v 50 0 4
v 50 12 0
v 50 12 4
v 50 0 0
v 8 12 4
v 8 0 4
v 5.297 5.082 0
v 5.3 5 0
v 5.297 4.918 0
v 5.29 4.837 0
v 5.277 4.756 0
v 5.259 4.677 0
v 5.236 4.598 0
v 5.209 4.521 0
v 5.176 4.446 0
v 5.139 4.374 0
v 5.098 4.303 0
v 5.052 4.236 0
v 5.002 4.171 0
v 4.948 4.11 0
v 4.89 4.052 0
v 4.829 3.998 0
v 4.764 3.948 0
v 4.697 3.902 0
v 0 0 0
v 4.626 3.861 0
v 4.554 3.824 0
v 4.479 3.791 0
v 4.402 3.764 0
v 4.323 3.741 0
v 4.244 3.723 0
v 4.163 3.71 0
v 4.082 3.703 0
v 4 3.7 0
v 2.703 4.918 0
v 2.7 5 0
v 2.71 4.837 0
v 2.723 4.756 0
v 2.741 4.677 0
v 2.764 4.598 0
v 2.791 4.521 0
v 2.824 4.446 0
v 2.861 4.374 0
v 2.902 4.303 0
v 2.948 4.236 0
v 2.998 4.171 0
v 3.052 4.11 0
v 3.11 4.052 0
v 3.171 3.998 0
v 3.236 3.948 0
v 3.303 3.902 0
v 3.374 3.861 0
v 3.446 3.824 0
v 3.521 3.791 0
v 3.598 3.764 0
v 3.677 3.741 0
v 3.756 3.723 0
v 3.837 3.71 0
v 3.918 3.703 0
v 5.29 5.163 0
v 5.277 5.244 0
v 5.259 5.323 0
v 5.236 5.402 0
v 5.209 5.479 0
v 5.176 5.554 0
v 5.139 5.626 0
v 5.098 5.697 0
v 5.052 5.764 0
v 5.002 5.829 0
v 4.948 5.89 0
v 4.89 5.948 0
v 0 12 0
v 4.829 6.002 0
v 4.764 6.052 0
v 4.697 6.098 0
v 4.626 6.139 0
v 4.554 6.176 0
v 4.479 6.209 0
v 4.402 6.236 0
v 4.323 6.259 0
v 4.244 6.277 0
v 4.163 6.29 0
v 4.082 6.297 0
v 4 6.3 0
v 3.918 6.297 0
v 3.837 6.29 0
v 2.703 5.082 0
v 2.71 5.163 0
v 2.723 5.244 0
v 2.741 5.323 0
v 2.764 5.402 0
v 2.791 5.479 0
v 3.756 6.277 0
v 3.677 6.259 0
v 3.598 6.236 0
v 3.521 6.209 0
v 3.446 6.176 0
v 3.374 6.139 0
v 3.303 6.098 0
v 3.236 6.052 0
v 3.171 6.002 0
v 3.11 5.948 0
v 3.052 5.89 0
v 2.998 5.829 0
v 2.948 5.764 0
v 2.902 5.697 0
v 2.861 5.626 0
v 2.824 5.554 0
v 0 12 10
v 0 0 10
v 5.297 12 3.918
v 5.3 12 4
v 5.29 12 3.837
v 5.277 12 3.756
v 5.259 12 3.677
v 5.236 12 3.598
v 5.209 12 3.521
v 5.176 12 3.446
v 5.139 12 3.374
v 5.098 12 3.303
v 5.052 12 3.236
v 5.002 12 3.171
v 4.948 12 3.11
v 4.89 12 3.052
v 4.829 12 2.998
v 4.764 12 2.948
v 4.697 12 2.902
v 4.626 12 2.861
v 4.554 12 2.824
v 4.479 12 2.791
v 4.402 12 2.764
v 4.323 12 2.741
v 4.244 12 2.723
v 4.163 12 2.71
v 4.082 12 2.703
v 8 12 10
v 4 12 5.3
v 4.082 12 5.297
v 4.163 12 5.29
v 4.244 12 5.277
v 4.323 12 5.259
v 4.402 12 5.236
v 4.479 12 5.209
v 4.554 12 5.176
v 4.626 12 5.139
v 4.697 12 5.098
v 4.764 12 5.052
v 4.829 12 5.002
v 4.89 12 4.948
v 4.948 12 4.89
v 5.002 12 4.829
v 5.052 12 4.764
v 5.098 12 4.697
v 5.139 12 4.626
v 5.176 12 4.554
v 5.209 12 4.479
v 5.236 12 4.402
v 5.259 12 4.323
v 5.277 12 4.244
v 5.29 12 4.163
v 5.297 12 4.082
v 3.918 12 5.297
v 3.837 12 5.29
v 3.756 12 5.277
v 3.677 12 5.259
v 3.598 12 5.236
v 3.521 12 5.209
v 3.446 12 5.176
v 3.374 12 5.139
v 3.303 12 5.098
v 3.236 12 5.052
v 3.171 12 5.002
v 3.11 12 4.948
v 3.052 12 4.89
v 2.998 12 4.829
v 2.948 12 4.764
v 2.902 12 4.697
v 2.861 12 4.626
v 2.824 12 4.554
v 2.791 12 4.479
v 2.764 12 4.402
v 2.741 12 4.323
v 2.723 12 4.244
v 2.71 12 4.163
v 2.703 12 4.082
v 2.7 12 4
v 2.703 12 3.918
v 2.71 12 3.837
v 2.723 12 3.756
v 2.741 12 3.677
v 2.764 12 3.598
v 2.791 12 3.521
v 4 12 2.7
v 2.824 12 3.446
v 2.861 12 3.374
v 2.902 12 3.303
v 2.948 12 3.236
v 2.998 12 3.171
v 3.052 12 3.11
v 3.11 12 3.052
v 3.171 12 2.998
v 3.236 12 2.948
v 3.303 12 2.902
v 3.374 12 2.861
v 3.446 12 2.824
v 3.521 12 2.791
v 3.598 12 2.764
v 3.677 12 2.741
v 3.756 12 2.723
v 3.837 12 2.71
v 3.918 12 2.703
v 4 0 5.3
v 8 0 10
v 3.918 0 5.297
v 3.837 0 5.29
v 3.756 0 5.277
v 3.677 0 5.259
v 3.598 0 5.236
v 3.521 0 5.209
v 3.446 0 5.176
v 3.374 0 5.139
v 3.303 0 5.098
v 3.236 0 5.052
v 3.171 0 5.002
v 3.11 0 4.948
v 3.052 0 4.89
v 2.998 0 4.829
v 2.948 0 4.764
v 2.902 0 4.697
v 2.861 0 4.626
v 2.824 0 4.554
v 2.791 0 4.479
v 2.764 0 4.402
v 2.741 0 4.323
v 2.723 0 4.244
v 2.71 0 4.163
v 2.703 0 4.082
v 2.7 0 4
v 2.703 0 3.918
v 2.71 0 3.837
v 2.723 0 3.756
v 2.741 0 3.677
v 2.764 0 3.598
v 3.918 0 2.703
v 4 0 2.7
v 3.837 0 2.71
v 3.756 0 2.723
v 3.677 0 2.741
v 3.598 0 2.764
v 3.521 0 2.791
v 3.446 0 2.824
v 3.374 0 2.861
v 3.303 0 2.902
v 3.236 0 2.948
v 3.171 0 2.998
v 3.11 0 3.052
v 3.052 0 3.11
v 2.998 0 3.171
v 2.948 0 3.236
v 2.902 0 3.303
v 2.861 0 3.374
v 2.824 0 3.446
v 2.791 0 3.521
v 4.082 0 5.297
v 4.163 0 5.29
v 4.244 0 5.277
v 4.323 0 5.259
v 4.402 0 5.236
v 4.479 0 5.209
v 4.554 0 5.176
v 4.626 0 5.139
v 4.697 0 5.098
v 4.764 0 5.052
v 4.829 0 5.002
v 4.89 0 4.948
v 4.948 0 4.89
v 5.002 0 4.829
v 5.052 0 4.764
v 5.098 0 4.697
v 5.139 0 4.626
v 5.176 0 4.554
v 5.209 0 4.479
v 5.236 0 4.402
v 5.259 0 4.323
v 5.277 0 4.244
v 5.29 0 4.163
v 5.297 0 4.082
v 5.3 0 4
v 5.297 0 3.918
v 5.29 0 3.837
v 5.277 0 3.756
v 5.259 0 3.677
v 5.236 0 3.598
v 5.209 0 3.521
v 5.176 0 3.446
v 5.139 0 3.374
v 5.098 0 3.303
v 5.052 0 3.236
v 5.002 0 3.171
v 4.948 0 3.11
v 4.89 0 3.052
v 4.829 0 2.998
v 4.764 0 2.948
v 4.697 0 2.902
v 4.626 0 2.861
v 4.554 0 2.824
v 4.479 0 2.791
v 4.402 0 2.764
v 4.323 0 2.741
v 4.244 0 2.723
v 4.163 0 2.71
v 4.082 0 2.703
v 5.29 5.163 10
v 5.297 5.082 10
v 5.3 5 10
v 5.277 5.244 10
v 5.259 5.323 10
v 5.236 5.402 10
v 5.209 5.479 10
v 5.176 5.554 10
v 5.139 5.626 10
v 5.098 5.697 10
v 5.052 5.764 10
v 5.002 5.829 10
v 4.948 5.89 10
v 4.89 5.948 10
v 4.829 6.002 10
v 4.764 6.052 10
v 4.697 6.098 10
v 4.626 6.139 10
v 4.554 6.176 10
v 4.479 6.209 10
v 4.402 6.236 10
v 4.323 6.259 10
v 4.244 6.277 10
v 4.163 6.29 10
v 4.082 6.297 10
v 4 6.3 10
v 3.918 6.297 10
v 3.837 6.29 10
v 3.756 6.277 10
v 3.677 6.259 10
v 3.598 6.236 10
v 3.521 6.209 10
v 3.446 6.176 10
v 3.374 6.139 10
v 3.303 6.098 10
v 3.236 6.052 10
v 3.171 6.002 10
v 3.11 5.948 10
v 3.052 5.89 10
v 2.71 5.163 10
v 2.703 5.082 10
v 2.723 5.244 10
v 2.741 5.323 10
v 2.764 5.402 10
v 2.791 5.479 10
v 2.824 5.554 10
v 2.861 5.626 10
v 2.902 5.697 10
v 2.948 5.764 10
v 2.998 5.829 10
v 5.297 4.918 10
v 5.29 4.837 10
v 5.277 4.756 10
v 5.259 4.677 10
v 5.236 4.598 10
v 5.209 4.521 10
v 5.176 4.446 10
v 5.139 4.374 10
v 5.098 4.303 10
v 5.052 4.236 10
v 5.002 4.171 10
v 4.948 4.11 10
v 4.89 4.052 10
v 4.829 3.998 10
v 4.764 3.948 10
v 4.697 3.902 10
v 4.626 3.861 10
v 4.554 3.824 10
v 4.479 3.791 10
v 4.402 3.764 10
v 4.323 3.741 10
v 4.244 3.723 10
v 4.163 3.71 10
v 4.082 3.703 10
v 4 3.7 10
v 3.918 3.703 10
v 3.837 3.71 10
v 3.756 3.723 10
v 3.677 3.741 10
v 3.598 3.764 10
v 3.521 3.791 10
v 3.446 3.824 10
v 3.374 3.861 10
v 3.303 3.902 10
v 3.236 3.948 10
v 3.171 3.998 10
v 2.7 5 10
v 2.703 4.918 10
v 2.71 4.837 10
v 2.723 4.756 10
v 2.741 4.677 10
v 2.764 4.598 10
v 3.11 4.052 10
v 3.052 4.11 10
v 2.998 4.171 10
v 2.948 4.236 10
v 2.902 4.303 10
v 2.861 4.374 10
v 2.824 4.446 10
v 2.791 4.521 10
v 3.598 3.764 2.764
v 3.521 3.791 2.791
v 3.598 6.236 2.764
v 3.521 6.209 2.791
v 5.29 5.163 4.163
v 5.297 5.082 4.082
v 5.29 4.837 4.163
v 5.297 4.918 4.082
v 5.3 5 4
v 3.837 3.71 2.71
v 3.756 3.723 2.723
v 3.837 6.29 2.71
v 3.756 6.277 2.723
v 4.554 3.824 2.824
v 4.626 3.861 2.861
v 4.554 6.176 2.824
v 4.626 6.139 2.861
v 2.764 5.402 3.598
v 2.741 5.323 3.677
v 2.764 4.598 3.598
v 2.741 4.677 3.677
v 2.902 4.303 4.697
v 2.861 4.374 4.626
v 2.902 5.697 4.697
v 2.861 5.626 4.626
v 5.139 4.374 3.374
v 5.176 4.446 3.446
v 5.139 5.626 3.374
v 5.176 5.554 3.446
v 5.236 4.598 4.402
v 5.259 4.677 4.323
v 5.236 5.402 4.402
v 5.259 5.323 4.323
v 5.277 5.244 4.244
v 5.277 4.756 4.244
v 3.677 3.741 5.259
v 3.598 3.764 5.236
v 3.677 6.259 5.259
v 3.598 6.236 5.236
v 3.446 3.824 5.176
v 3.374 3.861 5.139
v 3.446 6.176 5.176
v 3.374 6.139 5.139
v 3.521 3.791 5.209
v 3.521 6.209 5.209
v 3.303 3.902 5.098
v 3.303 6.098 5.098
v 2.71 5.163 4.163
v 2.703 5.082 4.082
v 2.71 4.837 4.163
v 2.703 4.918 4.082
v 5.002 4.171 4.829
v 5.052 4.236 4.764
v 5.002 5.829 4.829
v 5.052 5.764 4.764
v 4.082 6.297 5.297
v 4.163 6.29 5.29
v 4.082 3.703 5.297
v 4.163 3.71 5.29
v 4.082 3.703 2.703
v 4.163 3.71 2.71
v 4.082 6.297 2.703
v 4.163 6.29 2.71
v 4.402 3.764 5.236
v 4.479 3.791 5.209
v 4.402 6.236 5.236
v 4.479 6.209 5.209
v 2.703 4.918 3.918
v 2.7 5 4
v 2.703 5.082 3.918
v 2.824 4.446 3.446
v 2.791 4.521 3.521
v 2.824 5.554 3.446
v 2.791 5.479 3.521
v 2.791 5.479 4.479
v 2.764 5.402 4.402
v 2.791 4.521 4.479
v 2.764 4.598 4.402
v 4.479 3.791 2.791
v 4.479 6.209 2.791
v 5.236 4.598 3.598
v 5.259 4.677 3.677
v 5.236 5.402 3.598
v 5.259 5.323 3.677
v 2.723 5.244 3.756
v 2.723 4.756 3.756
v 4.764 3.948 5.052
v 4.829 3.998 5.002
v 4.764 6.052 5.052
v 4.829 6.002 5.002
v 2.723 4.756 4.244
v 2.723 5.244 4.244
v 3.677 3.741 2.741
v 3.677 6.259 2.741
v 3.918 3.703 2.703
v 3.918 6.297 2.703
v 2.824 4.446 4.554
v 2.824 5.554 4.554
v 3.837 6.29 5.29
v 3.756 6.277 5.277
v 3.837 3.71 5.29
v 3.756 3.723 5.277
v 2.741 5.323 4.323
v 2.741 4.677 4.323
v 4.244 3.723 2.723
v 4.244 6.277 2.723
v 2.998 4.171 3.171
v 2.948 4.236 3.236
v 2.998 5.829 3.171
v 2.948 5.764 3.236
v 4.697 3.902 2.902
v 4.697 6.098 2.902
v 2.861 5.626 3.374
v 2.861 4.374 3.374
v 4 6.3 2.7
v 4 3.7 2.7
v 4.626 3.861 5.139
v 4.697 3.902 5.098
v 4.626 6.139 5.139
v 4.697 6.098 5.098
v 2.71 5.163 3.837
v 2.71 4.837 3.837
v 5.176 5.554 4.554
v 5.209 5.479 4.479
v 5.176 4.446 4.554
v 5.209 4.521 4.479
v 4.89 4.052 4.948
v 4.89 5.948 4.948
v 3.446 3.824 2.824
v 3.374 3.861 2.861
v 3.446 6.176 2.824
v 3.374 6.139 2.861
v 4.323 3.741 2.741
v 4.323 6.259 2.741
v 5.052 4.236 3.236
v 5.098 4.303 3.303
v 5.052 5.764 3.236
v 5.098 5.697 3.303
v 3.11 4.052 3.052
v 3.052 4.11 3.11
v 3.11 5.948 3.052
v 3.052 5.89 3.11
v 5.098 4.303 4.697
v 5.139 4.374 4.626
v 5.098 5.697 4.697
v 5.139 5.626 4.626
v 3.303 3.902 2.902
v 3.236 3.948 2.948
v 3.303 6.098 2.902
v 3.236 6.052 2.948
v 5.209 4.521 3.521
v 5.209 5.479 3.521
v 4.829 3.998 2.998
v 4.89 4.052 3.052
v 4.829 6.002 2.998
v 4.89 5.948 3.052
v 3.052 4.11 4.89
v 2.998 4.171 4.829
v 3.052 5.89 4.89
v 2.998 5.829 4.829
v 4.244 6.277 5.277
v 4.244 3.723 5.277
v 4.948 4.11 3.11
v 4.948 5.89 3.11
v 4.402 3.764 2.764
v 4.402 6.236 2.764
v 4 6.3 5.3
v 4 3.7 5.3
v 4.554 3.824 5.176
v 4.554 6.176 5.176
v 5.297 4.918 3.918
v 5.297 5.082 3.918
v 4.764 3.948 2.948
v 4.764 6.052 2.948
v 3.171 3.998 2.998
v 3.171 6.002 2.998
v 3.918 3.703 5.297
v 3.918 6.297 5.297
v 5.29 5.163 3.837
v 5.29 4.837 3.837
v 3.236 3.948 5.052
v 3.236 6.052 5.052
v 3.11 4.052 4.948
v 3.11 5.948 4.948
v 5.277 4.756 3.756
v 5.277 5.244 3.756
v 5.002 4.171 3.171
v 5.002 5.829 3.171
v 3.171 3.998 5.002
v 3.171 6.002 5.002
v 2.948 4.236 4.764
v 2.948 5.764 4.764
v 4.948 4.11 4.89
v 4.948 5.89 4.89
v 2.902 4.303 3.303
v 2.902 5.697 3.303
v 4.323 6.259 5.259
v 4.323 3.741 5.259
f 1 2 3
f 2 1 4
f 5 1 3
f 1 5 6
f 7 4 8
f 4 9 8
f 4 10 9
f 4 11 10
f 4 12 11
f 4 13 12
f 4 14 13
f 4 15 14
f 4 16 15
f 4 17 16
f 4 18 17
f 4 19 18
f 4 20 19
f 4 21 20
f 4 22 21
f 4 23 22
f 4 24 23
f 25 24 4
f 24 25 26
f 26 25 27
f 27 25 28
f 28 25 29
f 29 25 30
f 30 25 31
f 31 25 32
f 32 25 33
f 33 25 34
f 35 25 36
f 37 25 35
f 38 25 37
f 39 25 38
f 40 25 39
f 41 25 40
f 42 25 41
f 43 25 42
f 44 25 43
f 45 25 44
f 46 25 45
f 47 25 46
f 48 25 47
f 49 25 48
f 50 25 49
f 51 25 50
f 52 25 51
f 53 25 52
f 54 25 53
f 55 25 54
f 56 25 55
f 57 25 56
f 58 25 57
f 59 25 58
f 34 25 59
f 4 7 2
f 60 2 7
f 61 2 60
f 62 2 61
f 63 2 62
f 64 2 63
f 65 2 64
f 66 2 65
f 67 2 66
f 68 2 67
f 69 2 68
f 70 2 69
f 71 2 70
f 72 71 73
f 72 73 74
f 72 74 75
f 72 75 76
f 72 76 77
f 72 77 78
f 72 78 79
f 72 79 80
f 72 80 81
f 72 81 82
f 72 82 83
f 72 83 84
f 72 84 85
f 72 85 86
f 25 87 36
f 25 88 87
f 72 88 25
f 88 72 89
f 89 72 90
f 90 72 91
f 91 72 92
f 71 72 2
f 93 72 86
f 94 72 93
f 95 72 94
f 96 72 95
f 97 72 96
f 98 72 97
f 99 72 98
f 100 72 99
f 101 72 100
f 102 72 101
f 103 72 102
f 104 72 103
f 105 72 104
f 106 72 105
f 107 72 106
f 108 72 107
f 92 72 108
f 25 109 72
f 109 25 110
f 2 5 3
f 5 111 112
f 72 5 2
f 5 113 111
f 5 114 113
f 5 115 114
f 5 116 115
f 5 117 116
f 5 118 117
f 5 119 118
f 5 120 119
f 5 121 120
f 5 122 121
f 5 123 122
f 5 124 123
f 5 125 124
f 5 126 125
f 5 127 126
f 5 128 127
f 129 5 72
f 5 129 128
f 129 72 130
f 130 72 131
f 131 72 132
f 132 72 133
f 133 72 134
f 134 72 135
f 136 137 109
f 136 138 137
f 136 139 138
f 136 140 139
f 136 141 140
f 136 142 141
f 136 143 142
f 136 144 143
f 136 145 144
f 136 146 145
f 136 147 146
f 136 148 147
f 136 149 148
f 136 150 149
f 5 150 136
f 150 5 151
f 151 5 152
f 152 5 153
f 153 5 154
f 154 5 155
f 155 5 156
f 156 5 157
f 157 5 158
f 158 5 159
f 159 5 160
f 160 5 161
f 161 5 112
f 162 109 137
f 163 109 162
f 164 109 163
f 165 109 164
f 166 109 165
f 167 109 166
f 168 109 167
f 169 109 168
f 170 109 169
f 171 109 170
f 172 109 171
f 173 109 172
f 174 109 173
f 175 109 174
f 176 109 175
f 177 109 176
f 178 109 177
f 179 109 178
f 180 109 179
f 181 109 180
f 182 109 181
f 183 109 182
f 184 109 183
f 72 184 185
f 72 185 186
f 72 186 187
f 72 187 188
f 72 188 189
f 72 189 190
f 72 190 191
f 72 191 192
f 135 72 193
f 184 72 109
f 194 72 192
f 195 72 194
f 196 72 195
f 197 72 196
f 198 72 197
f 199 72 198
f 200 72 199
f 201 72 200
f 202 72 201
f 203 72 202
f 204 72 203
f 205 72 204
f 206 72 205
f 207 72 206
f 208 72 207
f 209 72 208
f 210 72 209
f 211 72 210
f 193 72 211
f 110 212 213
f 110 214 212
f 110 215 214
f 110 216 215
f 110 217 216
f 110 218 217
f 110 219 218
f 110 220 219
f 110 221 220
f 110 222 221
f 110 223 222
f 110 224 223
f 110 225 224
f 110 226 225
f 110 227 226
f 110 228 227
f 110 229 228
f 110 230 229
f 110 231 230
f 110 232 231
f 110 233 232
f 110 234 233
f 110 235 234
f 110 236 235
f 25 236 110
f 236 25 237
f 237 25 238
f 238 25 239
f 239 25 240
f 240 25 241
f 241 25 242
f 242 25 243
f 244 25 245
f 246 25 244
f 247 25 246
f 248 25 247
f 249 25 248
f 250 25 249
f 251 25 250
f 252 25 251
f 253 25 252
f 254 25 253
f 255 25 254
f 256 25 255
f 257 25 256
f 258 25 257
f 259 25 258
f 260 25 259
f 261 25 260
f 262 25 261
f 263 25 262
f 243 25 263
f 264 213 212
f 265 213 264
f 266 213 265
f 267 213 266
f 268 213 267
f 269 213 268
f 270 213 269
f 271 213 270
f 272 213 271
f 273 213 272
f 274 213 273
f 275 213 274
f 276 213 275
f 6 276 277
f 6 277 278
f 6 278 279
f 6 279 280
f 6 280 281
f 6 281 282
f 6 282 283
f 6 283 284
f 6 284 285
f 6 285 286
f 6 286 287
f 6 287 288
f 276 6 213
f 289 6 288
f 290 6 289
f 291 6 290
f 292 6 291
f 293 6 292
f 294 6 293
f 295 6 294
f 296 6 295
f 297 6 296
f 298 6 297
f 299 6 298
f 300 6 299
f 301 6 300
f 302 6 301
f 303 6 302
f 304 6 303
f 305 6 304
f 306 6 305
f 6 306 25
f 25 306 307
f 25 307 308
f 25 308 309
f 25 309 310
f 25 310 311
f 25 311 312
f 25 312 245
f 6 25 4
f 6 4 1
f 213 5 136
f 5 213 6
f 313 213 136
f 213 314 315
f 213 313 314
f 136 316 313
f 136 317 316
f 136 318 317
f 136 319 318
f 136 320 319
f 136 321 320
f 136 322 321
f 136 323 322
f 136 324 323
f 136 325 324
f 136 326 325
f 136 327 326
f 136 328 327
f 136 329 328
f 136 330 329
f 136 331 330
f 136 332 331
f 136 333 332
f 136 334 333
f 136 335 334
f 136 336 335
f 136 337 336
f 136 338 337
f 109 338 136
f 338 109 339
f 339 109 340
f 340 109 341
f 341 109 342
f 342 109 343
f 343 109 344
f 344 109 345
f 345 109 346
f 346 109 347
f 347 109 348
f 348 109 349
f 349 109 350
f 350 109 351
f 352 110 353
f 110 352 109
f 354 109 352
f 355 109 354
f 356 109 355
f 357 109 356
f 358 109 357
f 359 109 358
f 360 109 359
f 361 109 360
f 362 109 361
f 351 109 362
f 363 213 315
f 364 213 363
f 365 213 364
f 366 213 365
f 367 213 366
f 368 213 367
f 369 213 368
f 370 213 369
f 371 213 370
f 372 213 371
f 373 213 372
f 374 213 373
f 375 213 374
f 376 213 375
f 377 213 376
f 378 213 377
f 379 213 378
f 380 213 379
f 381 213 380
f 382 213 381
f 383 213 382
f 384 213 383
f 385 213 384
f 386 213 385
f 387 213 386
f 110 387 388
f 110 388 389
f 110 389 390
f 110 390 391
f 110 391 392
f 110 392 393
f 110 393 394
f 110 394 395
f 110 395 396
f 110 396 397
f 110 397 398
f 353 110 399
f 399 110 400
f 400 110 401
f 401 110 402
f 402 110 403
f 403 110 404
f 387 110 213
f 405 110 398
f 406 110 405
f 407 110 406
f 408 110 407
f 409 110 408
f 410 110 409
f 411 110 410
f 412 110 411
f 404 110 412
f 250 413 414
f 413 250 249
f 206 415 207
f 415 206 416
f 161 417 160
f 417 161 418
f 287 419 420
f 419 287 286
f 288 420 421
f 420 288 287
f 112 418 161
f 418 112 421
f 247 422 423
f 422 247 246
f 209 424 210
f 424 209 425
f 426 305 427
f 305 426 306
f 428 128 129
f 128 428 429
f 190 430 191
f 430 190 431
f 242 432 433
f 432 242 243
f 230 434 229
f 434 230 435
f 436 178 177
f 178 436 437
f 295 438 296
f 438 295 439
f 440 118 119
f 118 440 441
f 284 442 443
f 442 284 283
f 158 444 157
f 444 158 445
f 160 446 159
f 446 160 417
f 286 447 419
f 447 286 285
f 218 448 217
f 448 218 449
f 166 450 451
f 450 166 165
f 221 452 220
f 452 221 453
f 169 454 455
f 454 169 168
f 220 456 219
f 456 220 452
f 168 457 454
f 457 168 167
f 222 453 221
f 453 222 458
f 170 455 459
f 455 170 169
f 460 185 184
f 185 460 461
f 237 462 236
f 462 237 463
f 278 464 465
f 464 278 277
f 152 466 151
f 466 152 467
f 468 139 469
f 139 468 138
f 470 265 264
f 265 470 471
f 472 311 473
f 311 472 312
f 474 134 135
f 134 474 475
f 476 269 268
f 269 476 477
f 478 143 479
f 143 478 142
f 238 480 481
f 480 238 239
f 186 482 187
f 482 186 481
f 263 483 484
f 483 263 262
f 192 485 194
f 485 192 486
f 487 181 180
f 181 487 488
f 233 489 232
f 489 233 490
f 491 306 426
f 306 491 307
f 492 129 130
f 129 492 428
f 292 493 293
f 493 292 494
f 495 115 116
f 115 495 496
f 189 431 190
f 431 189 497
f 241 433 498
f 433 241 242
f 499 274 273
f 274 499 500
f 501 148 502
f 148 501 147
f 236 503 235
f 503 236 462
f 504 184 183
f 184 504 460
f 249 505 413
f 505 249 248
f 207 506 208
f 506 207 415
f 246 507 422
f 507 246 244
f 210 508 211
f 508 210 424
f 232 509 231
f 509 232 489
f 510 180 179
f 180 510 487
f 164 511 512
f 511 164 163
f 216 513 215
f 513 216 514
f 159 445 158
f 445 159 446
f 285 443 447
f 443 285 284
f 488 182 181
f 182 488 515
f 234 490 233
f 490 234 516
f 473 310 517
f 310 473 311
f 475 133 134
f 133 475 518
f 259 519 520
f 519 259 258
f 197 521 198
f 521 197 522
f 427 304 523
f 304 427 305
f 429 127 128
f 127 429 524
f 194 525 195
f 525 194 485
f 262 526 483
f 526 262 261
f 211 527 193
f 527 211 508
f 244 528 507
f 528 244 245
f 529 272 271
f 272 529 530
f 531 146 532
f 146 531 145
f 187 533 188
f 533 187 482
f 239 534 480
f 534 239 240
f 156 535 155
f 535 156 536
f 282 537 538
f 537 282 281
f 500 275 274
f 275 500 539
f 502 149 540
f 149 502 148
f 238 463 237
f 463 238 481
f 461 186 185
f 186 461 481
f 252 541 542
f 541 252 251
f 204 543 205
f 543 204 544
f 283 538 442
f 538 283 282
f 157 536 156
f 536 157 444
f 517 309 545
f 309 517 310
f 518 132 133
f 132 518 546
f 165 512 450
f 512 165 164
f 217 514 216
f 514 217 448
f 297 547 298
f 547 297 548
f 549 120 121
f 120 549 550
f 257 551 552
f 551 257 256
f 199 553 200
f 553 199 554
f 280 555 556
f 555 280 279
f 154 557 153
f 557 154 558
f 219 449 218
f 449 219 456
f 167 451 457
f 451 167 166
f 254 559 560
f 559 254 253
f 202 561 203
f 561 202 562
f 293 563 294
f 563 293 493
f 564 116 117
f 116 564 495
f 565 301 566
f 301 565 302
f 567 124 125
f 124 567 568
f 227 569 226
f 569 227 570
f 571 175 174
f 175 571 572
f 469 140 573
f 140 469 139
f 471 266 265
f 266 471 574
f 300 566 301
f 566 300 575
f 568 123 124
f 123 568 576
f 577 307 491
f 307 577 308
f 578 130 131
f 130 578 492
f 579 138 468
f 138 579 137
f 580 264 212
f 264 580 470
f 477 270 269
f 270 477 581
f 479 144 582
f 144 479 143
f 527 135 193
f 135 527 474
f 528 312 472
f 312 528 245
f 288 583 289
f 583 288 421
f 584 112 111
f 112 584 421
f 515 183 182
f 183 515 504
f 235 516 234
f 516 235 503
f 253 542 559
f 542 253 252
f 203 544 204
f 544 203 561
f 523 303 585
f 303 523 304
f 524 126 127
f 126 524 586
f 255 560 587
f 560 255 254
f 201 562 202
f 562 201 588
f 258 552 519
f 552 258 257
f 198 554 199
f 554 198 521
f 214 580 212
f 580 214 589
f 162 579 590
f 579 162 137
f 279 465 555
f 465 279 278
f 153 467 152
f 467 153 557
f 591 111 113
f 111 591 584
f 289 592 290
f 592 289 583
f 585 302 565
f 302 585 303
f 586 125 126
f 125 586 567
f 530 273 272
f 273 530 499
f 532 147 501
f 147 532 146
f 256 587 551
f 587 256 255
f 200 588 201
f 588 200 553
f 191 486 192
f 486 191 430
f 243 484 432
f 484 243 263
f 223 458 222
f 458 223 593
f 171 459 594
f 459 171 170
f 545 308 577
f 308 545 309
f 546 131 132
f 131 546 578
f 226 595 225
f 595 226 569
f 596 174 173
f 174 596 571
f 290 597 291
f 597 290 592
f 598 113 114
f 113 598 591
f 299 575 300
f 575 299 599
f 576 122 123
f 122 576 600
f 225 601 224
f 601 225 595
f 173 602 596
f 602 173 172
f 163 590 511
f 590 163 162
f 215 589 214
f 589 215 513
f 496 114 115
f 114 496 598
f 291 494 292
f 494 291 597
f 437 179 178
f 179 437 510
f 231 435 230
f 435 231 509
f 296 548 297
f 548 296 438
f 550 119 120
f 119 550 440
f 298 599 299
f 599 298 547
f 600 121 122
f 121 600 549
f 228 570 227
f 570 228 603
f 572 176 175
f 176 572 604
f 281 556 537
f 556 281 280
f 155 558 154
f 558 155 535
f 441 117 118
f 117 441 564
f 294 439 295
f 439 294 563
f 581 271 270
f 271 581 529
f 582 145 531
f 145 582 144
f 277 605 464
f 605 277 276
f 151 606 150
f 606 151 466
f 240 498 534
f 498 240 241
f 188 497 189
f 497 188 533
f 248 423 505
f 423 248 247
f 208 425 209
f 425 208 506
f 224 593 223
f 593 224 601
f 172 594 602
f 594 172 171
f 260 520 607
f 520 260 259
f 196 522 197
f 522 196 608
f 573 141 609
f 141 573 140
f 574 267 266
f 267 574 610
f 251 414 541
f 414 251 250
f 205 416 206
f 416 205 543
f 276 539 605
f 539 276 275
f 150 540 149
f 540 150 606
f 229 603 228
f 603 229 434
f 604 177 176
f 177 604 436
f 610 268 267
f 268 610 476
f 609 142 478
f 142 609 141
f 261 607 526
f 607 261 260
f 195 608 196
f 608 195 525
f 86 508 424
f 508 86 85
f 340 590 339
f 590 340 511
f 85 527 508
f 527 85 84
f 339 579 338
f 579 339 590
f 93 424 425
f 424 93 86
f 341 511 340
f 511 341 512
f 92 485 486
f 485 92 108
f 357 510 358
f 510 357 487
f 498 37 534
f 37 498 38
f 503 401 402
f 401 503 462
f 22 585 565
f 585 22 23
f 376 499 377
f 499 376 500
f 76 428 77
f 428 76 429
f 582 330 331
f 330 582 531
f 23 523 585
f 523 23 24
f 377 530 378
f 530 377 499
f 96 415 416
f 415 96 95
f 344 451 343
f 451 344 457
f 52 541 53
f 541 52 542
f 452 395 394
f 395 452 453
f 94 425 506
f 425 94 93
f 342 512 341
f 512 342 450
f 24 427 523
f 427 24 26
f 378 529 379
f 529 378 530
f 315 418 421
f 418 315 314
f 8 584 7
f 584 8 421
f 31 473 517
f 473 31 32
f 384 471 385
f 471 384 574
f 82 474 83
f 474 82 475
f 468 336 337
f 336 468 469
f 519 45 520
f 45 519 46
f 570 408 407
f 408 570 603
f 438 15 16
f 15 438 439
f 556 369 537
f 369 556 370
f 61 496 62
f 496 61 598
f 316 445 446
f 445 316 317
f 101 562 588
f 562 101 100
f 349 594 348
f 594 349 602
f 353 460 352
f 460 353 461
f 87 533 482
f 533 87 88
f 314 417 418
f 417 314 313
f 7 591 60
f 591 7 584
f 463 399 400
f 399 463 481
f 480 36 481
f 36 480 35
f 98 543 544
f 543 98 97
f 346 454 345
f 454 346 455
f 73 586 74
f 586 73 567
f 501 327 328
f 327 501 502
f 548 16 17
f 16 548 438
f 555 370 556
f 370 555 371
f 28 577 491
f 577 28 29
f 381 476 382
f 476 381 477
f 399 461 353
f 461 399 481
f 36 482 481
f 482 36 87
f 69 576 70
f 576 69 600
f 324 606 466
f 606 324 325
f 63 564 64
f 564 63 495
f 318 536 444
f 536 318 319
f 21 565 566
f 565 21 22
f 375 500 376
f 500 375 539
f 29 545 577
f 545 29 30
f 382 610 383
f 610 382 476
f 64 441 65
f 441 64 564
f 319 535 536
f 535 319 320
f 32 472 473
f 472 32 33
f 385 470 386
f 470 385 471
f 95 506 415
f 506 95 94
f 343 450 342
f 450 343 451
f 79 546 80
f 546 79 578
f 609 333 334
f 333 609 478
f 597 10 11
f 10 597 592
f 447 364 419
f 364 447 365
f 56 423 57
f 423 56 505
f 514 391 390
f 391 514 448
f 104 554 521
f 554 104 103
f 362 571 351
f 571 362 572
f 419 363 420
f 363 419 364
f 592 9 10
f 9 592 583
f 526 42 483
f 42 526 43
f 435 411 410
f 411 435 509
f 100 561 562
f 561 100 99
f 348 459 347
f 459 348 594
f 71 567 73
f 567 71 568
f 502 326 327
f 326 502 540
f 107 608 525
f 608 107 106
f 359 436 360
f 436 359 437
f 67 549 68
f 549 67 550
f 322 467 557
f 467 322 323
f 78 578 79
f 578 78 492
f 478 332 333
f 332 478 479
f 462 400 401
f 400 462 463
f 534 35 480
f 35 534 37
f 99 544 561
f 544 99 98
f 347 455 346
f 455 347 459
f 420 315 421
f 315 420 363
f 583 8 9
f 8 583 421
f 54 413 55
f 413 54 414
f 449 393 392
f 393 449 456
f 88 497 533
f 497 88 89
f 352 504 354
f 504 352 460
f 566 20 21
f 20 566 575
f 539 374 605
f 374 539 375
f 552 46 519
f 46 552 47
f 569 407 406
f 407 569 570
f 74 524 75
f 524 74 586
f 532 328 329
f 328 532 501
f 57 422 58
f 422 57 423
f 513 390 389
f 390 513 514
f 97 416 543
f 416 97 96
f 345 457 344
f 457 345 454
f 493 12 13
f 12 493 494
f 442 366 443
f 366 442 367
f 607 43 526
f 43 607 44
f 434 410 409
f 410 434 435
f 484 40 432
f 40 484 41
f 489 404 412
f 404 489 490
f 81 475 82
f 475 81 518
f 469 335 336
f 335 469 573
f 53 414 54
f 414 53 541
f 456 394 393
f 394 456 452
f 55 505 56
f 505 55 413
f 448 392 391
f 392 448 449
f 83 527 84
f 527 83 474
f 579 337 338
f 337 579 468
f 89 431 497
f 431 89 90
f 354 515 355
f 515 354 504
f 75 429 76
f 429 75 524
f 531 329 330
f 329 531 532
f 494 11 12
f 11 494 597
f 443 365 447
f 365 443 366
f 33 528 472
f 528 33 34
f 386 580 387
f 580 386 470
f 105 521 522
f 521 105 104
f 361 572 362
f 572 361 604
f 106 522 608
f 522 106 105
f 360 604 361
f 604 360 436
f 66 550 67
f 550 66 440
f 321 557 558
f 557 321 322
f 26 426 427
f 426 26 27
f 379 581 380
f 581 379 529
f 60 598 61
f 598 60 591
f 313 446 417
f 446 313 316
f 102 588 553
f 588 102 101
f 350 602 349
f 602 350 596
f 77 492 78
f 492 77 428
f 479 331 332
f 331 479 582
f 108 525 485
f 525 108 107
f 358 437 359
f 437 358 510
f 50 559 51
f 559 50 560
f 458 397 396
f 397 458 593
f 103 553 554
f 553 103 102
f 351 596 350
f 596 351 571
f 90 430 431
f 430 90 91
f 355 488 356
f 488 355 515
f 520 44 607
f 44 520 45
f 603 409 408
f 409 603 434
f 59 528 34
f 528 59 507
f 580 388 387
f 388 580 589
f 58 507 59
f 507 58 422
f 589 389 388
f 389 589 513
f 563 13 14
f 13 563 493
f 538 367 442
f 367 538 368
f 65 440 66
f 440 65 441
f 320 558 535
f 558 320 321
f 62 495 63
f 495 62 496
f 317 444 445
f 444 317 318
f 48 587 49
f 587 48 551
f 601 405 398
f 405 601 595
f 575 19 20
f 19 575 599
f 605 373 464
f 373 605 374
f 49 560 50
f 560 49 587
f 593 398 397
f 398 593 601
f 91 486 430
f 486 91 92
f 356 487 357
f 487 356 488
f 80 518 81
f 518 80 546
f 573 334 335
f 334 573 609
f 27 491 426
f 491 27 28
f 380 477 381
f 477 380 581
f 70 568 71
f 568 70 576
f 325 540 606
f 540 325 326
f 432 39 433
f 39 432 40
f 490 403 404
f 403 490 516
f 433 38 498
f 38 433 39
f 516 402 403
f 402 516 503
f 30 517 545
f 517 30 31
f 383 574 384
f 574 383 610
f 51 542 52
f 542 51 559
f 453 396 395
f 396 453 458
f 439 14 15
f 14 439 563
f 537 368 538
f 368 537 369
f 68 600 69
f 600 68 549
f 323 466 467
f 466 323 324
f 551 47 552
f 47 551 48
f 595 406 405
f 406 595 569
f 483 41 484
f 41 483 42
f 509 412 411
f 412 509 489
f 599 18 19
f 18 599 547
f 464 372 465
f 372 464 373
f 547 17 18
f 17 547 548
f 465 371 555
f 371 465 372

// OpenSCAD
difference(){
	union(){
        
       translate([0,0,0]){
           cube([50,12,4], center=false);
       }
       translate([0,0,0]){
           cube([8,12,10], center=false);
       }




	
	}
	union() {
       translate([4,20,4]){
            rotate(a = [90,0,0]) {
              cylinder(h=600, r=1.3, $fn=100, center=false);
            }
       }	
       translate([4,5,-20]){
            rotate(a = [0,0,90]) {
              cylinder(h=600, r=1.3, $fn=100, center=false);
            }
       }	

       
	}
}
